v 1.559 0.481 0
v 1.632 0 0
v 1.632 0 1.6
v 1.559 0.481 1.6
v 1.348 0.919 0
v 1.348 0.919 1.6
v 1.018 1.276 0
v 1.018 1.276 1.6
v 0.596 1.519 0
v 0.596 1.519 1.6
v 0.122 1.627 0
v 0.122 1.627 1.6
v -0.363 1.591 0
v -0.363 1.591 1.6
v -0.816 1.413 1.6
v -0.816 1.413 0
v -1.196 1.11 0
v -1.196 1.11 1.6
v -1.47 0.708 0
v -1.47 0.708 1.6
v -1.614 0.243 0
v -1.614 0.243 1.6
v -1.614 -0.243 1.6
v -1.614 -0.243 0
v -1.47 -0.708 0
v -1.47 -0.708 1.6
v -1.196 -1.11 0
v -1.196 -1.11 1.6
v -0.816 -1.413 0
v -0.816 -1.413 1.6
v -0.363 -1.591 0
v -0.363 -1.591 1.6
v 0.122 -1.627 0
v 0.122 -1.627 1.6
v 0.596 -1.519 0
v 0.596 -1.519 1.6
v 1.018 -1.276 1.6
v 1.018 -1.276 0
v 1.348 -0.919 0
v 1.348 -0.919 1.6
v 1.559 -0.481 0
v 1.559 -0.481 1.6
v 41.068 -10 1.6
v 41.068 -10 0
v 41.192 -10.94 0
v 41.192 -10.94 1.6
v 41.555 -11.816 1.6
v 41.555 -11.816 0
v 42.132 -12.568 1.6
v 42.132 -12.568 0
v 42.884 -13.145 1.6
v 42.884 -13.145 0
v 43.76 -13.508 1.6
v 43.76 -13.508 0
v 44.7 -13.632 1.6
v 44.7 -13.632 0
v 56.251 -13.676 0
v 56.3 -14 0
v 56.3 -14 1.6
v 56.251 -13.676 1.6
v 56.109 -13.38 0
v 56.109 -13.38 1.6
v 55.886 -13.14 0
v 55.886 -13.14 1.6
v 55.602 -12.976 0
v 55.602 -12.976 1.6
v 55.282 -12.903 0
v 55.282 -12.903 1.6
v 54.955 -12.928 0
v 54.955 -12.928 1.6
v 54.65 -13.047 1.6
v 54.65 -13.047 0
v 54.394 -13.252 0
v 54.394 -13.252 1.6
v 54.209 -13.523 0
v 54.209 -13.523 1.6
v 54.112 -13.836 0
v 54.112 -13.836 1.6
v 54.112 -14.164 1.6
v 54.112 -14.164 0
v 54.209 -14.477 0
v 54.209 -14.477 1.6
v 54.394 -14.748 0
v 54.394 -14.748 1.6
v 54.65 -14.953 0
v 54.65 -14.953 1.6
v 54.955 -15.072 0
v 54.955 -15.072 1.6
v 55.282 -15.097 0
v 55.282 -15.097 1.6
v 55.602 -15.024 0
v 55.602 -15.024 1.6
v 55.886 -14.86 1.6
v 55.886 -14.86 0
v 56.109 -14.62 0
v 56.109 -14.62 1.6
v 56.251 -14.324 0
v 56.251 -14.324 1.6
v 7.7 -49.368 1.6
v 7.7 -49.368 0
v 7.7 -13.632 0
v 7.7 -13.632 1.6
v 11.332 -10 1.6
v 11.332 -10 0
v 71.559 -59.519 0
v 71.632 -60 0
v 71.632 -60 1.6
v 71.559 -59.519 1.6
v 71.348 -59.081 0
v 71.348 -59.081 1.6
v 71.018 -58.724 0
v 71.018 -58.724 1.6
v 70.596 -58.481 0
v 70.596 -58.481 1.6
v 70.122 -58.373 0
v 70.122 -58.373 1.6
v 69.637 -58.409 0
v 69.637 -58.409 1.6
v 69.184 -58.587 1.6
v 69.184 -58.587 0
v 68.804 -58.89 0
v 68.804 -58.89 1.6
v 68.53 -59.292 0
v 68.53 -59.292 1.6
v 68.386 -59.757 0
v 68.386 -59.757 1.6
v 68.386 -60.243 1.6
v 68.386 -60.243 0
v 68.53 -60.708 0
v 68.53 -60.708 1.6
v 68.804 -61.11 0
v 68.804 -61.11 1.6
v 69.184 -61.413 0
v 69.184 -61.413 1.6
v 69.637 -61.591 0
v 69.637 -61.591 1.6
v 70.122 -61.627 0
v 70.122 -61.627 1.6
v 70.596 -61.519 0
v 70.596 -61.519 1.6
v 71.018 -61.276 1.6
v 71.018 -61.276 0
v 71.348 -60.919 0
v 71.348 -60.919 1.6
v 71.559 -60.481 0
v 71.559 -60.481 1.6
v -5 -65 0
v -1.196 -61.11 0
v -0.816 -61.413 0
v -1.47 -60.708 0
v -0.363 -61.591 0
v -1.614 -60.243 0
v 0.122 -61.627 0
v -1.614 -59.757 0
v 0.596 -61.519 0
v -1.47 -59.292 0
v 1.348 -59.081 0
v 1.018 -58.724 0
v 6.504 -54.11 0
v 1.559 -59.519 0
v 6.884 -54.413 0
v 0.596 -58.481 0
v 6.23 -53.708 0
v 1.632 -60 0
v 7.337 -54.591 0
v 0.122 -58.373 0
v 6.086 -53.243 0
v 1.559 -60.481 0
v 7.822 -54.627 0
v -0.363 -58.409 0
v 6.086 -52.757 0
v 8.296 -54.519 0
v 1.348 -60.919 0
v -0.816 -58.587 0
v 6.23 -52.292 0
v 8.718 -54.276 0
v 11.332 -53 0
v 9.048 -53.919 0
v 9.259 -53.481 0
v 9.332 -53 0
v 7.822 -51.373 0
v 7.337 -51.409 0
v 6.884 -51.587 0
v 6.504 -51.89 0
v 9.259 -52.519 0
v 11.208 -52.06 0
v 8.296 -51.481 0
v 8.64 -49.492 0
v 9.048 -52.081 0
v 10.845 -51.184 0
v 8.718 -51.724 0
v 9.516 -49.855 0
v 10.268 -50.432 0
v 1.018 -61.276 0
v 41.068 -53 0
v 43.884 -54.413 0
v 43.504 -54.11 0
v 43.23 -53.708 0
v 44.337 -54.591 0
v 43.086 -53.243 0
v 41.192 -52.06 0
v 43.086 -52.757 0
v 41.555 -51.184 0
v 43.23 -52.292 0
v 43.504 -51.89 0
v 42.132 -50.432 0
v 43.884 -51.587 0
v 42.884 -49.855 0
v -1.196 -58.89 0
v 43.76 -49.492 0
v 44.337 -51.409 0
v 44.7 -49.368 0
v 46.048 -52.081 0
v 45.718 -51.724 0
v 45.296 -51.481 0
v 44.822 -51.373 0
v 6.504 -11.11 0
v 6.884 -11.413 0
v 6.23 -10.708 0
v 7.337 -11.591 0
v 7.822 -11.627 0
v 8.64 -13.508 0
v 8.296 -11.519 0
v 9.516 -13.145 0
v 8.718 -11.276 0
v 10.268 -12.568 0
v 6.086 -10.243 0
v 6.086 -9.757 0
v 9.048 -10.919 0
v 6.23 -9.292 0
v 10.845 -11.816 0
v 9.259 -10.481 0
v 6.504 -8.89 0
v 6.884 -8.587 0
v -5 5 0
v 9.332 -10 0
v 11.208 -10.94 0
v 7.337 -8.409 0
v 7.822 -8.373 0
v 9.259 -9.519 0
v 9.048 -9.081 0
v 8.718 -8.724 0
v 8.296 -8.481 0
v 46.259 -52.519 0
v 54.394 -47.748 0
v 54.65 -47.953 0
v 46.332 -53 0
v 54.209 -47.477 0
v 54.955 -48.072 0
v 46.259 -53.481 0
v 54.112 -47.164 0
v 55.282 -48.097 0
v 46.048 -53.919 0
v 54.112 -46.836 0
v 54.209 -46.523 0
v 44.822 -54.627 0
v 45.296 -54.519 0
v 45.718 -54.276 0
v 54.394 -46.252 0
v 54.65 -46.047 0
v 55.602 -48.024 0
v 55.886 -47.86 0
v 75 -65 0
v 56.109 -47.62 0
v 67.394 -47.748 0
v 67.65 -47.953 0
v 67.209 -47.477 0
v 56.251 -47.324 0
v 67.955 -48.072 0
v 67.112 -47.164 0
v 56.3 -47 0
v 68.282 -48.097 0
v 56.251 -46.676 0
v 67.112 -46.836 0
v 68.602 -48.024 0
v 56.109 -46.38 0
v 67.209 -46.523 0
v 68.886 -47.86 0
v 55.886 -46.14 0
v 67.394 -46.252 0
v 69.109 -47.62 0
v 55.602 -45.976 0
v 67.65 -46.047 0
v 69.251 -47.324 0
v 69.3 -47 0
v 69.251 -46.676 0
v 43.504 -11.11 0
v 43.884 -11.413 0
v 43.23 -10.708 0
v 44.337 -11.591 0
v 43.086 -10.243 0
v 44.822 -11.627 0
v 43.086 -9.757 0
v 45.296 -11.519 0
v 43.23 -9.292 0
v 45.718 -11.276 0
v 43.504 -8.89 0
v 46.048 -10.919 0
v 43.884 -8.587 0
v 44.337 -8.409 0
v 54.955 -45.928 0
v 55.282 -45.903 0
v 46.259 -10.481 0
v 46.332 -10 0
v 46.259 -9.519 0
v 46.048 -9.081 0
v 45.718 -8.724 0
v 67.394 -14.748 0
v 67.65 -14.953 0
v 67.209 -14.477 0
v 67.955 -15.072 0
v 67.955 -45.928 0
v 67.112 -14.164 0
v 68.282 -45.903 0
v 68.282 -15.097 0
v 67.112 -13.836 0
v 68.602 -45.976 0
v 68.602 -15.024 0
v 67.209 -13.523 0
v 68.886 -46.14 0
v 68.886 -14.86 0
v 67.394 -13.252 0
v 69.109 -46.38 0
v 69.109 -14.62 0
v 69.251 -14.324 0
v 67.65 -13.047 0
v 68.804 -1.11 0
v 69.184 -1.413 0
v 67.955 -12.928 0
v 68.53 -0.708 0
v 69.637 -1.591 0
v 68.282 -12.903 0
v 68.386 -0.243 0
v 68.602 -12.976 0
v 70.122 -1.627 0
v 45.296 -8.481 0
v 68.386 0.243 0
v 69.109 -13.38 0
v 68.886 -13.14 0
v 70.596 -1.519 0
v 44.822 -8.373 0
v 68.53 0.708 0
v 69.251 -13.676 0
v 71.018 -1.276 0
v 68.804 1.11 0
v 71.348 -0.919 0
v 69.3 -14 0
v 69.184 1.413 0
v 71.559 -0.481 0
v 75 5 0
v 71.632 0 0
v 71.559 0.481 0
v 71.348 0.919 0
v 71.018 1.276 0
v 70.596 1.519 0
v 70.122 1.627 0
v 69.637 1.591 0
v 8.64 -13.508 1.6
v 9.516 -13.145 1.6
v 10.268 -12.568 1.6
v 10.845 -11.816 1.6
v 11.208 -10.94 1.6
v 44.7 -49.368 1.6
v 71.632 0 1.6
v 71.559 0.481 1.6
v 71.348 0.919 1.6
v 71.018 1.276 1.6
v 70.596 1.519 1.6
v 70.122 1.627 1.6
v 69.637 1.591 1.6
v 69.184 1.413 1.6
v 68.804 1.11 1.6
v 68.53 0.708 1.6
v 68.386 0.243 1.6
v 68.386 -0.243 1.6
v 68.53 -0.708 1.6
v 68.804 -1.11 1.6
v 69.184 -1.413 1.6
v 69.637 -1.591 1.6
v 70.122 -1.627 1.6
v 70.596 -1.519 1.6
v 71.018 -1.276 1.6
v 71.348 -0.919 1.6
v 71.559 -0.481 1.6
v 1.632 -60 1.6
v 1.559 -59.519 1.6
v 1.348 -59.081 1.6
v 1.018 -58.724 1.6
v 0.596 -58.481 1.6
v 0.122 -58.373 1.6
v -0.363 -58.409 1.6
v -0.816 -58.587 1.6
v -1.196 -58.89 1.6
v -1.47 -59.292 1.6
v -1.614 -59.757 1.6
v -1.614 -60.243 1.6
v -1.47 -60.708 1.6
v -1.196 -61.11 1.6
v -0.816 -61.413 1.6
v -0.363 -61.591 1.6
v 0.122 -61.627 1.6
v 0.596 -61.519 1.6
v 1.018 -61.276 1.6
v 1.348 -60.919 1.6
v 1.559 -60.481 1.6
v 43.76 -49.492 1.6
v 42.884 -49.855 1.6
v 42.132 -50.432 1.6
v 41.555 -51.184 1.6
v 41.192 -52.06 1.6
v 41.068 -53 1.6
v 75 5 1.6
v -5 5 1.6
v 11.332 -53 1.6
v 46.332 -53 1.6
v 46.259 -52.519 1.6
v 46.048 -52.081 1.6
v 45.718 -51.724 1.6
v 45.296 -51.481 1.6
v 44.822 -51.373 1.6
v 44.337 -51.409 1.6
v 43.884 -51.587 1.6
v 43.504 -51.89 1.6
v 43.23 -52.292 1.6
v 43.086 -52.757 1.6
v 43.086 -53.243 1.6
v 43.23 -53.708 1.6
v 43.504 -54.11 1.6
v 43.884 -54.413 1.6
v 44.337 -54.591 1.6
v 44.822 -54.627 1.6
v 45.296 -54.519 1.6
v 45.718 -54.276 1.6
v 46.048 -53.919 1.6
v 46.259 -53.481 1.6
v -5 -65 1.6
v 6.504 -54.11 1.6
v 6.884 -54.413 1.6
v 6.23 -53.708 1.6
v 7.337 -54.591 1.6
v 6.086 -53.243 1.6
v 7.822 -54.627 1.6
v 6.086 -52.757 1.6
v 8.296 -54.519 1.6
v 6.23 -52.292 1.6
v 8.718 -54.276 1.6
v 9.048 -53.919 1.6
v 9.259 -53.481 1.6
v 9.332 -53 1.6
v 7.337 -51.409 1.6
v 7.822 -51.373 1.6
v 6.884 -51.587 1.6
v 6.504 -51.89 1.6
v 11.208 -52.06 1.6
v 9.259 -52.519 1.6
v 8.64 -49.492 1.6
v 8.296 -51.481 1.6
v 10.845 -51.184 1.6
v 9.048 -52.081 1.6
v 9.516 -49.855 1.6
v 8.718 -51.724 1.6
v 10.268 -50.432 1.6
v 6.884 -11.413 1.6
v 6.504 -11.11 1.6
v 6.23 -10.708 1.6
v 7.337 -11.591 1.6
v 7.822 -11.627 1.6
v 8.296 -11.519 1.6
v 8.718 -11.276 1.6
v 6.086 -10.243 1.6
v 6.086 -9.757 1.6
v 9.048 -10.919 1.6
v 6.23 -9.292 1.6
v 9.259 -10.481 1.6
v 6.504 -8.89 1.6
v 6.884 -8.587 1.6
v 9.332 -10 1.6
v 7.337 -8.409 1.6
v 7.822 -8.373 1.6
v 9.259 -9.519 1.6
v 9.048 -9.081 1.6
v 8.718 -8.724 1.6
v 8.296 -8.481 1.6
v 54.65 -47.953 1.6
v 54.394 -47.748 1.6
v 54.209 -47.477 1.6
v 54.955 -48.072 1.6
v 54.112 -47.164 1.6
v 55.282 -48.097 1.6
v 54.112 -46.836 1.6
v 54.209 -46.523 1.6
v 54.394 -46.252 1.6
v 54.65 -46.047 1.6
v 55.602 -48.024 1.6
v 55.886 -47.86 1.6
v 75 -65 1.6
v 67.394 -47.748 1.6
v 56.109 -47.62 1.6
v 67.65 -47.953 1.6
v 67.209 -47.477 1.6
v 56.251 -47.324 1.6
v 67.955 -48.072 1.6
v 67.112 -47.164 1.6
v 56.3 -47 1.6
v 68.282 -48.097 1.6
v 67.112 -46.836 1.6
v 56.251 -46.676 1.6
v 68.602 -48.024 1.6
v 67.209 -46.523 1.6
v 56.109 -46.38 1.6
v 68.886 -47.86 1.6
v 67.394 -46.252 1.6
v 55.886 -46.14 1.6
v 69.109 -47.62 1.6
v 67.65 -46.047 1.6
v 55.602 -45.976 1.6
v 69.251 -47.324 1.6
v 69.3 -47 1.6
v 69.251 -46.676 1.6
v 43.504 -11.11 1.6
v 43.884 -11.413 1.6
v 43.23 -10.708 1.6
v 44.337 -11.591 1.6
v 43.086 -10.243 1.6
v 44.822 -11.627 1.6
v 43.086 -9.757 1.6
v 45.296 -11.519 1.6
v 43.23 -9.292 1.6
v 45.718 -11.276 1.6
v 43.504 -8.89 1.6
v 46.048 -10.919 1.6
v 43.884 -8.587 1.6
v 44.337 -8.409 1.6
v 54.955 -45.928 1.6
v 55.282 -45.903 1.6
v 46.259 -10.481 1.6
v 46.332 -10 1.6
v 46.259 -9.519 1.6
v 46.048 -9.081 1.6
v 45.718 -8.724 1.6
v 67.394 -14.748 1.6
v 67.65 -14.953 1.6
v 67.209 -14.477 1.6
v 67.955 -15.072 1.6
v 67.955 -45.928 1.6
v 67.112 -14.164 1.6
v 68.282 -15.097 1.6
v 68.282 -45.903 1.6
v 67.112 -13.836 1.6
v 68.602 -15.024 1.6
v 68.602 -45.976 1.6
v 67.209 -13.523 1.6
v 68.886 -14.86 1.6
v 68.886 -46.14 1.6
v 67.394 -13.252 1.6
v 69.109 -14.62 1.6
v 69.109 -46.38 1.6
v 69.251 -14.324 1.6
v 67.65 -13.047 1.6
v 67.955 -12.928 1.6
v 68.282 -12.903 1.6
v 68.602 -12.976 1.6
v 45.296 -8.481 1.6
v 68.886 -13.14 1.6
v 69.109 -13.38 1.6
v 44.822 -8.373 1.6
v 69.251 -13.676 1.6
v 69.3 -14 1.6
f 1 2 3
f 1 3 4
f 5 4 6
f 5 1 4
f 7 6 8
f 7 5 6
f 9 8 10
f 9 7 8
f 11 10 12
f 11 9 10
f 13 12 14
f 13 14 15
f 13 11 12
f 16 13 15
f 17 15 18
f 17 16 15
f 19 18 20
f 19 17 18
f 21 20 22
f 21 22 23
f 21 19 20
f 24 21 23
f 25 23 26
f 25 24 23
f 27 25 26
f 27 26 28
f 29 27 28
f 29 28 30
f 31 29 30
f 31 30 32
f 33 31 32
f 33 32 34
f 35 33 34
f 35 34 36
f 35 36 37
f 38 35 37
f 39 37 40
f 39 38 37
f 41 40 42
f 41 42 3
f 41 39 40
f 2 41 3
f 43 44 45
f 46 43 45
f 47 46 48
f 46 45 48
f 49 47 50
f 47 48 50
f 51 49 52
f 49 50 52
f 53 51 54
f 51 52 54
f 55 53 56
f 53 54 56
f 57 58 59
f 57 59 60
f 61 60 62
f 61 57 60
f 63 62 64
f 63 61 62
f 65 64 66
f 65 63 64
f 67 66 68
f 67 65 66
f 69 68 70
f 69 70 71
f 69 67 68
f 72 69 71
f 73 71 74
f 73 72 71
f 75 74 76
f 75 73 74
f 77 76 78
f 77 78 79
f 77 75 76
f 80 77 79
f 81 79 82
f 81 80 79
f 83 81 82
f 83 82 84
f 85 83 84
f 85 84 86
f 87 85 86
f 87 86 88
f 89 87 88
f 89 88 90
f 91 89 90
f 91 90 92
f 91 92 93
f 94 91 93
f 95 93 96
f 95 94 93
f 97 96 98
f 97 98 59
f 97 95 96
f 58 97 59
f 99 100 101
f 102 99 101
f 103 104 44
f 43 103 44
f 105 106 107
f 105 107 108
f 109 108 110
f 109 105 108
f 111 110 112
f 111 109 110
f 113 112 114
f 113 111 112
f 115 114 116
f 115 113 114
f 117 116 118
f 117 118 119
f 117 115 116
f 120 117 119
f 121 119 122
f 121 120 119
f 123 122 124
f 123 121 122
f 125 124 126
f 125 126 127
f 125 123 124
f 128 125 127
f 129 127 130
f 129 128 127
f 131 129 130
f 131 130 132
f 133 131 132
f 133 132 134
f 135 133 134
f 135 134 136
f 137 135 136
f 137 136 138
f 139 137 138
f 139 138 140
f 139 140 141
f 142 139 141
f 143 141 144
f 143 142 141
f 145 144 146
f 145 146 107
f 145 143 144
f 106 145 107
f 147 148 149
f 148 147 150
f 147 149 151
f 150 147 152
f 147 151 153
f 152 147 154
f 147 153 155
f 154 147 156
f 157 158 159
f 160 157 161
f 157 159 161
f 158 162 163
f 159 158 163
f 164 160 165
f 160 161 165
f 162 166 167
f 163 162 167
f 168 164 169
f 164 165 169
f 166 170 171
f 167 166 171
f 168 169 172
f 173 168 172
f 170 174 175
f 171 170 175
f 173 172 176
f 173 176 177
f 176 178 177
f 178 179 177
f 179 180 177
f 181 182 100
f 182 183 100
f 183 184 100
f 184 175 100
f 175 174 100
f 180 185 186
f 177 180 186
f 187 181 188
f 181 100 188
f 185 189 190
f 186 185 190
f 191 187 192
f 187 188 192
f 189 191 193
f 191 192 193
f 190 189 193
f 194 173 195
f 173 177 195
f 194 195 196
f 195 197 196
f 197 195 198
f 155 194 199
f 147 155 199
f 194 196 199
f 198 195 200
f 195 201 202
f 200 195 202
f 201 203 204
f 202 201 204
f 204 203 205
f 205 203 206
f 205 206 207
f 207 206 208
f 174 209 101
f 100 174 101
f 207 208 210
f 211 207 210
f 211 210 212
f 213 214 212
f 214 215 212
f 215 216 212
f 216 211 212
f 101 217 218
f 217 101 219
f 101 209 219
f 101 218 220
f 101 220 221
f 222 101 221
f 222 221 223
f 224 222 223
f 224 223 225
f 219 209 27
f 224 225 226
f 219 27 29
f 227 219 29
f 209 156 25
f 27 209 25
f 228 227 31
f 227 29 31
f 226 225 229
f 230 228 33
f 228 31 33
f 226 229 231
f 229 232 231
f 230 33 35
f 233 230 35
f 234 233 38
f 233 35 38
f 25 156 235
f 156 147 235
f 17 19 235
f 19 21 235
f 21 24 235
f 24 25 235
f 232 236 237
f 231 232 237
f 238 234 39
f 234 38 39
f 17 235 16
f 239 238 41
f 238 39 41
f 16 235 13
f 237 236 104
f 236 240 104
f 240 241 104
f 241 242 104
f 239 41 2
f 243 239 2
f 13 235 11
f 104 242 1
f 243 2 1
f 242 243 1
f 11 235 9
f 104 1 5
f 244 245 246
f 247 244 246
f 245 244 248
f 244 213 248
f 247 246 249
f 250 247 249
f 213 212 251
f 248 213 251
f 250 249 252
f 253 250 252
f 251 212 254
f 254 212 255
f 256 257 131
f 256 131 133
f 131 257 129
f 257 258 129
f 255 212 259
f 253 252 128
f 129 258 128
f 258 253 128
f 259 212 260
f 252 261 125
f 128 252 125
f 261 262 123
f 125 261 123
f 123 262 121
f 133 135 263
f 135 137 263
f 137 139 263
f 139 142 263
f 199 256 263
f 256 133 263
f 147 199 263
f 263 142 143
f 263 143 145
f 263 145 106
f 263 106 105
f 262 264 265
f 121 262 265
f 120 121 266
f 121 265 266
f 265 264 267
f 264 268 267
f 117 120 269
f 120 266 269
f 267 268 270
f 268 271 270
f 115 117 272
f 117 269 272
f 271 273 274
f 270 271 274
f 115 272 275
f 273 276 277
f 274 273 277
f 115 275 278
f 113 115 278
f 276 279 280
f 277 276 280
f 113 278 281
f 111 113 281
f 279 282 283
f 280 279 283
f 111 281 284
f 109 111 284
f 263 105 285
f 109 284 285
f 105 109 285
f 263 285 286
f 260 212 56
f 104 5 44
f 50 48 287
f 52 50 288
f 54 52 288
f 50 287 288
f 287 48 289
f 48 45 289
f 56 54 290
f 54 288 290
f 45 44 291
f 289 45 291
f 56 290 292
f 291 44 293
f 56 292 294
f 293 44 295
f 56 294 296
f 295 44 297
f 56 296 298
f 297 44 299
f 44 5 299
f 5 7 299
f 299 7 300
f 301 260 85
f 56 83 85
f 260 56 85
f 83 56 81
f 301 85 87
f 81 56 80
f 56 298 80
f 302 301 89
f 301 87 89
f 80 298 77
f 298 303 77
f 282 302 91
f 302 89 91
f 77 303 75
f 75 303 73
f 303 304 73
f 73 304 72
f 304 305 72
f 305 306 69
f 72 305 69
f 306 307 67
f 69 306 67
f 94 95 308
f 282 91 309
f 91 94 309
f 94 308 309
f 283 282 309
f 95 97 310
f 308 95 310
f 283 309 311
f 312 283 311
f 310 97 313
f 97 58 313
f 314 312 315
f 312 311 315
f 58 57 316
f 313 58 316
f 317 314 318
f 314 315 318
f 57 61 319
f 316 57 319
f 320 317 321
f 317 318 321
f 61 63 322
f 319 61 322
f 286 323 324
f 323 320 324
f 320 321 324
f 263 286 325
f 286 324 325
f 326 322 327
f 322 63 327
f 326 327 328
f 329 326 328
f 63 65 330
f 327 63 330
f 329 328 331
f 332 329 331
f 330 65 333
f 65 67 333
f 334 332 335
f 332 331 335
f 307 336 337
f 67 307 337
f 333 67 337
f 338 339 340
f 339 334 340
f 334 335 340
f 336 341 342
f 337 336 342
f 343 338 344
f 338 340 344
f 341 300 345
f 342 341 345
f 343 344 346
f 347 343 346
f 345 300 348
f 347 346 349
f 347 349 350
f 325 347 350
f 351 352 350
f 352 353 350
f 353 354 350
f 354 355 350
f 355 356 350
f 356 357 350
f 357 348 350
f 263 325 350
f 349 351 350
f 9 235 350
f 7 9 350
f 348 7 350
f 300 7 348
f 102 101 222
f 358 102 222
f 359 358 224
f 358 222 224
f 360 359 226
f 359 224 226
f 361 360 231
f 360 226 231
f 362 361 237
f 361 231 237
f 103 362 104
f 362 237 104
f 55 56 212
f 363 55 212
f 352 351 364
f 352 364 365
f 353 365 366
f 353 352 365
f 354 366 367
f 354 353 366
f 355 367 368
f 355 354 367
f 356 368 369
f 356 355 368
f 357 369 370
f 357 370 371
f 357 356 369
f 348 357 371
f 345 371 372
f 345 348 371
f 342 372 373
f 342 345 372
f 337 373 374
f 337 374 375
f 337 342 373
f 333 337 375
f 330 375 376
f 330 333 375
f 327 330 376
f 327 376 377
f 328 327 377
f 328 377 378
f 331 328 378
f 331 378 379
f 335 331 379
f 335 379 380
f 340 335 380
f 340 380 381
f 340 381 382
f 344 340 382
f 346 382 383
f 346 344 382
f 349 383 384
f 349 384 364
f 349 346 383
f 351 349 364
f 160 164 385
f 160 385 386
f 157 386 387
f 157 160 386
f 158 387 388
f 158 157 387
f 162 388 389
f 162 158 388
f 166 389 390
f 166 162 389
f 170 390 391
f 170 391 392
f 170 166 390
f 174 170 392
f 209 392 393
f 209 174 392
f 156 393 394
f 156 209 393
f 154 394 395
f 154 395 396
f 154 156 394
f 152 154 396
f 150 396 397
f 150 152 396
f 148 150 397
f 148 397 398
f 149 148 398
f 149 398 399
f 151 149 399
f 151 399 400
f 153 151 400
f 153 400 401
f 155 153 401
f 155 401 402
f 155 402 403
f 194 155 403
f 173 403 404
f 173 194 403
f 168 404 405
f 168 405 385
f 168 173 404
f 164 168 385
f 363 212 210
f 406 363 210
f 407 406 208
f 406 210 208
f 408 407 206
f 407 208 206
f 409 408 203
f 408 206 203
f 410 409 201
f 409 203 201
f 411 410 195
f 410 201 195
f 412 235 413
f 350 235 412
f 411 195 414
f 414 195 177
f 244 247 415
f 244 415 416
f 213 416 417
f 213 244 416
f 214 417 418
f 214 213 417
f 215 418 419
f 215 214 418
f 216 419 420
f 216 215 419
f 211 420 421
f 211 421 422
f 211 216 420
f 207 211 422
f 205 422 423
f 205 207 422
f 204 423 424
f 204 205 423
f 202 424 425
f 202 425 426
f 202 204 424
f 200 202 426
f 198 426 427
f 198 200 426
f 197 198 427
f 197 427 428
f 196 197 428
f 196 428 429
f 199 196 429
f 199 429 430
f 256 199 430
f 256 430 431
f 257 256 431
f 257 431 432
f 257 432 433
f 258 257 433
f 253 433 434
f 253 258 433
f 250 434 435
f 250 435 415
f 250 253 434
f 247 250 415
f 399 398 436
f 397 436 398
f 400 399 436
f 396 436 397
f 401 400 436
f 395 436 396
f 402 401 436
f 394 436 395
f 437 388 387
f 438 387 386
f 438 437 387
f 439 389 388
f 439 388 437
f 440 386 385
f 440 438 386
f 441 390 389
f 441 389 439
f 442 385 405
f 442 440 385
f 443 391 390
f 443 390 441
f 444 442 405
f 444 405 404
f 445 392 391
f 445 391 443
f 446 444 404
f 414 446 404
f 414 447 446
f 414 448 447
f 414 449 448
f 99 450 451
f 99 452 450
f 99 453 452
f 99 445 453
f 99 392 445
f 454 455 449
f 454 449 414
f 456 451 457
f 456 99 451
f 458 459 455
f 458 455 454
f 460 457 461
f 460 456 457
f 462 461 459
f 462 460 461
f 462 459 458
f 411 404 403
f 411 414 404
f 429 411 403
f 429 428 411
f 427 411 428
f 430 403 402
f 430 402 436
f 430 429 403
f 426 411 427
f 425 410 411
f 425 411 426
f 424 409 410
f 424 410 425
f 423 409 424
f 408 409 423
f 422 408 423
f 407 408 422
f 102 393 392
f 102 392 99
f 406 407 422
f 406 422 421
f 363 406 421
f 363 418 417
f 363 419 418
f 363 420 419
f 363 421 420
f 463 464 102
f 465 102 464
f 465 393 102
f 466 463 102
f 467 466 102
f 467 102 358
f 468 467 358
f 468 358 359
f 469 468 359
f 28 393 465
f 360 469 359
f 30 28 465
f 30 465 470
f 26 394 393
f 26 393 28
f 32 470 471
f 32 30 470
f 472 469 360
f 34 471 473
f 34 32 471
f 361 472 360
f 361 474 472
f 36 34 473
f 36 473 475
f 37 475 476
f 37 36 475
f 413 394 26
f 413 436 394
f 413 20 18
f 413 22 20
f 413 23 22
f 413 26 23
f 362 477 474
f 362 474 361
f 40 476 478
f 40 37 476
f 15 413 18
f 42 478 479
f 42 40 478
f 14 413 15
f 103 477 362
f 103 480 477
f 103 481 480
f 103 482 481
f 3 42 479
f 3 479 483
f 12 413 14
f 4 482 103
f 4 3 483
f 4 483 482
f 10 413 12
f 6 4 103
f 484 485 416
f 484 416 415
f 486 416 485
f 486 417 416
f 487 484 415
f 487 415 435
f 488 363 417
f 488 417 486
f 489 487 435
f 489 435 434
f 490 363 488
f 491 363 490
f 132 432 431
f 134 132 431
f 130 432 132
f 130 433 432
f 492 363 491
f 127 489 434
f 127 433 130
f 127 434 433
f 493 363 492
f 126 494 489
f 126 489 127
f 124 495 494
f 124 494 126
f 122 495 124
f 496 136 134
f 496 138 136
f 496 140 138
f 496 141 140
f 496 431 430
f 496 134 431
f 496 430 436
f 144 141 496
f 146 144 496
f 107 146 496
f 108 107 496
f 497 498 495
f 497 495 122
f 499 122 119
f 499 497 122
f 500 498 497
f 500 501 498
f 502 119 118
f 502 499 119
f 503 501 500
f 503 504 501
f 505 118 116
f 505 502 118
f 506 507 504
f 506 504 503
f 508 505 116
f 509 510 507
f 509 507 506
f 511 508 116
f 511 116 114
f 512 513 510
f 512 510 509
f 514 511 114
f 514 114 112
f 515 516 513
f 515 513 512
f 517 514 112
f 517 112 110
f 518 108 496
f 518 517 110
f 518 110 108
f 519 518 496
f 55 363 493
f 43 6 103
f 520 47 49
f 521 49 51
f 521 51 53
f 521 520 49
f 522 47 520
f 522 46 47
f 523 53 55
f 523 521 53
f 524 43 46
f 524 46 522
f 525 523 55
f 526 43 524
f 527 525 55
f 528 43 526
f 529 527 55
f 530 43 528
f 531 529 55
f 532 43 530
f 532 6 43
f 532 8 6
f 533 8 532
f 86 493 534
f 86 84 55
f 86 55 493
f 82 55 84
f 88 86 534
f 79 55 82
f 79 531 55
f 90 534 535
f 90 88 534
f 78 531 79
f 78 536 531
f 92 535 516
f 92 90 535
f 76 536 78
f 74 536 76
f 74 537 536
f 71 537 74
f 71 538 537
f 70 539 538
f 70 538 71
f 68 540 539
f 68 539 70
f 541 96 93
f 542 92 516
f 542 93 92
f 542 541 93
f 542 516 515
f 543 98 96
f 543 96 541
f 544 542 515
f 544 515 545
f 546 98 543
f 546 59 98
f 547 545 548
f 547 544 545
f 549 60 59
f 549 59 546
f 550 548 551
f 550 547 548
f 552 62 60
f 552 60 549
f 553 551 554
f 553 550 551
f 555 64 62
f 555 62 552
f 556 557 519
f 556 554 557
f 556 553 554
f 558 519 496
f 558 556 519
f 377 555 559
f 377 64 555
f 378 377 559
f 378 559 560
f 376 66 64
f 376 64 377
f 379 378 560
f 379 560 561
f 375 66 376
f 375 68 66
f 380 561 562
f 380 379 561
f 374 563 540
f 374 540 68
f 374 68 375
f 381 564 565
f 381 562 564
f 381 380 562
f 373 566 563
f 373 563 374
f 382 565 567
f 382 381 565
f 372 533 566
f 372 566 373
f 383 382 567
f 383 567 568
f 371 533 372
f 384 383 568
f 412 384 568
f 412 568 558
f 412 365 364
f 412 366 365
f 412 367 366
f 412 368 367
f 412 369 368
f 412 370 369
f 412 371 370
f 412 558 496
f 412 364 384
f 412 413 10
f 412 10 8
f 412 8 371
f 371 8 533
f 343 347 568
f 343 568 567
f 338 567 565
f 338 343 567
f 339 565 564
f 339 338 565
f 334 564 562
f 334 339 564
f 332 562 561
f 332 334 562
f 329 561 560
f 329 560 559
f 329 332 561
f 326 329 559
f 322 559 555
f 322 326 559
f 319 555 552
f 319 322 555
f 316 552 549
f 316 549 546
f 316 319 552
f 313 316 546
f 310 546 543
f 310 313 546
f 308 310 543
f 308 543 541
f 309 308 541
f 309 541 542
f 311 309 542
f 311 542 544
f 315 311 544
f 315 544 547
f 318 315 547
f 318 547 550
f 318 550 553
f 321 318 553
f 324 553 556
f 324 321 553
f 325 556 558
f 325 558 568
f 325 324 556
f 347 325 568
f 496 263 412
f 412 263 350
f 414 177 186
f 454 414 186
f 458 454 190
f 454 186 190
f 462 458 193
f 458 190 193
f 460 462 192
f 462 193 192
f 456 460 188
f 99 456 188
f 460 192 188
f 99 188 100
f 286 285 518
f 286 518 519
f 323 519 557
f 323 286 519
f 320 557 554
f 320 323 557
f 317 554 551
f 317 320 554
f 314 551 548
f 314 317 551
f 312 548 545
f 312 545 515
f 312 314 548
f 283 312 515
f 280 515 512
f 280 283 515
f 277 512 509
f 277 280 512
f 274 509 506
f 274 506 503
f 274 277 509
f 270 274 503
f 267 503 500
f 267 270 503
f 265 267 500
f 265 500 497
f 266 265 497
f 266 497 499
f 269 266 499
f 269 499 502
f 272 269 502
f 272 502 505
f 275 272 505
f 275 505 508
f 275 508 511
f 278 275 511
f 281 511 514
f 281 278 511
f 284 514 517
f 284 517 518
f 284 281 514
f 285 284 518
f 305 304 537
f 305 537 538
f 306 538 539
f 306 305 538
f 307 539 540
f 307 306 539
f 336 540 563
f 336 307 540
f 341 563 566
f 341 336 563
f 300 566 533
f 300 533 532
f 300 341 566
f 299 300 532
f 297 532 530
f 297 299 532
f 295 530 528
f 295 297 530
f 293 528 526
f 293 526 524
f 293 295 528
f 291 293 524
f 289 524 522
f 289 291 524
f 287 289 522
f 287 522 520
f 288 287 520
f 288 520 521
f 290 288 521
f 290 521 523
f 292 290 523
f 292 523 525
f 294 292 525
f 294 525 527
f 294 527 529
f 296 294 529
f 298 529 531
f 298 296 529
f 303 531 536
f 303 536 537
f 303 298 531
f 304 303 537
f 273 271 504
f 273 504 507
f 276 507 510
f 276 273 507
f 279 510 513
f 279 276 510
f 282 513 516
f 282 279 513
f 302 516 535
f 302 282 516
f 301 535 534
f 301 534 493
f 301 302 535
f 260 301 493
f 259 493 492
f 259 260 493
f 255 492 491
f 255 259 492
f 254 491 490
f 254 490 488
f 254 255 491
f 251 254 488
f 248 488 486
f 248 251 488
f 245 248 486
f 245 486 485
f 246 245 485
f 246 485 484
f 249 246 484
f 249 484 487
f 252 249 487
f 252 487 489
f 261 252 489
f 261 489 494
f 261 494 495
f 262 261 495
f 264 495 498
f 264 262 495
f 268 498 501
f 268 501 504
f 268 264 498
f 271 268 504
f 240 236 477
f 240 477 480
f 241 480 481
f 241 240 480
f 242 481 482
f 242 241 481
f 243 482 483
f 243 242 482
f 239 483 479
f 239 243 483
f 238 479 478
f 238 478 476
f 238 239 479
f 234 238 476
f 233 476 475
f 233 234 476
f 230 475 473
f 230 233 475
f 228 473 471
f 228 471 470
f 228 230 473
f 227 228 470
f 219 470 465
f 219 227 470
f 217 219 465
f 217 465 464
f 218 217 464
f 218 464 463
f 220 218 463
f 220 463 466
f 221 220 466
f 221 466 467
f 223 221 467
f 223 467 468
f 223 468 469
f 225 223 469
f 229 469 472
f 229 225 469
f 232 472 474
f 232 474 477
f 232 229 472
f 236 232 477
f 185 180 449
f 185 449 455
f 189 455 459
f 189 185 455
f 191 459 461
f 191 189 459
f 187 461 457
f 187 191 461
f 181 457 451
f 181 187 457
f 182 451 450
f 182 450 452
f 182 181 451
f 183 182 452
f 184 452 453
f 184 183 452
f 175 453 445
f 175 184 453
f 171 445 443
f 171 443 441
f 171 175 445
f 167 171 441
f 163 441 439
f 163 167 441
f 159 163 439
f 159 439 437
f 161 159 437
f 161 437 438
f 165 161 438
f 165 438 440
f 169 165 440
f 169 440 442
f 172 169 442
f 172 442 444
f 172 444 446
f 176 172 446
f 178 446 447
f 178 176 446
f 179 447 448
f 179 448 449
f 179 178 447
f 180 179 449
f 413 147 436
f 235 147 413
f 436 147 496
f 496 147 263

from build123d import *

# Parameters (mm, degrees)
SKETCH1_W           = 80
SKETCH1_H           = 70
SKETCH1_R           = 1.63195
SKETCH1_R_2         = 1.1
BOSS_EXTRUDE1_DEPTH = 1.6


with BuildPart() as part:
    # Sketch1 → Boss-Extrude1 (new body)
    with BuildSketch(Plane.XY):
        with Locations((35, -30)):
            Rectangle(SKETCH1_W, SKETCH1_H)
        with Locations((0, -60)):
            Circle(SKETCH1_R, mode=Mode.SUBTRACT)
        with BuildLine():
            Line((7.7, -49.36805), (7.7, -13.63195))
            ThreePointArc((7.7, -13.63195), (10.268176474, -12.568176474), (11.33195, -10))
            Line((11.33195, -10), (41.06805, -10))
            ThreePointArc((41.06805, -10), (42.131823526, -12.568176474), (44.7, -13.63195))
            Line((44.7, -13.63195), (44.7, -49.36805))
            ThreePointArc((44.7, -49.36805), (42.131823526, -50.431823526), (41.06805, -53))
            Line((41.06805, -53), (11.33195, -53))
            ThreePointArc((11.33195, -53), (10.268176474, -50.431823526), (7.7, -49.36805))
        make_face(mode=Mode.SUBTRACT)
        with Locations((70, -60)):
            Circle(SKETCH1_R, mode=Mode.SUBTRACT)
        with Locations((55.2, -47)):
            Circle(SKETCH1_R_2, mode=Mode.SUBTRACT)
        with Locations((68.2, -47)):
            Circle(SKETCH1_R_2, mode=Mode.SUBTRACT)
        Circle(SKETCH1_R, mode=Mode.SUBTRACT)
        with Locations((55.2, -14)):
            Circle(SKETCH1_R_2, mode=Mode.SUBTRACT)
        with Locations((68.2, -14)):
            Circle(SKETCH1_R_2, mode=Mode.SUBTRACT)
        with Locations((70, 0)):
            Circle(SKETCH1_R, mode=Mode.SUBTRACT)
        with Locations((7.7, -10)):
            Circle(SKETCH1_R, mode=Mode.SUBTRACT)
        with Locations((44.7, -10)):
            Circle(SKETCH1_R, mode=Mode.SUBTRACT)
        with Locations((7.7, -53)):
            Circle(SKETCH1_R, mode=Mode.SUBTRACT)
        with Locations((44.7, -53)):
            Circle(SKETCH1_R, mode=Mode.SUBTRACT)
    extrude(amount=BOSS_EXTRUDE1_DEPTH)


solid = part.part
